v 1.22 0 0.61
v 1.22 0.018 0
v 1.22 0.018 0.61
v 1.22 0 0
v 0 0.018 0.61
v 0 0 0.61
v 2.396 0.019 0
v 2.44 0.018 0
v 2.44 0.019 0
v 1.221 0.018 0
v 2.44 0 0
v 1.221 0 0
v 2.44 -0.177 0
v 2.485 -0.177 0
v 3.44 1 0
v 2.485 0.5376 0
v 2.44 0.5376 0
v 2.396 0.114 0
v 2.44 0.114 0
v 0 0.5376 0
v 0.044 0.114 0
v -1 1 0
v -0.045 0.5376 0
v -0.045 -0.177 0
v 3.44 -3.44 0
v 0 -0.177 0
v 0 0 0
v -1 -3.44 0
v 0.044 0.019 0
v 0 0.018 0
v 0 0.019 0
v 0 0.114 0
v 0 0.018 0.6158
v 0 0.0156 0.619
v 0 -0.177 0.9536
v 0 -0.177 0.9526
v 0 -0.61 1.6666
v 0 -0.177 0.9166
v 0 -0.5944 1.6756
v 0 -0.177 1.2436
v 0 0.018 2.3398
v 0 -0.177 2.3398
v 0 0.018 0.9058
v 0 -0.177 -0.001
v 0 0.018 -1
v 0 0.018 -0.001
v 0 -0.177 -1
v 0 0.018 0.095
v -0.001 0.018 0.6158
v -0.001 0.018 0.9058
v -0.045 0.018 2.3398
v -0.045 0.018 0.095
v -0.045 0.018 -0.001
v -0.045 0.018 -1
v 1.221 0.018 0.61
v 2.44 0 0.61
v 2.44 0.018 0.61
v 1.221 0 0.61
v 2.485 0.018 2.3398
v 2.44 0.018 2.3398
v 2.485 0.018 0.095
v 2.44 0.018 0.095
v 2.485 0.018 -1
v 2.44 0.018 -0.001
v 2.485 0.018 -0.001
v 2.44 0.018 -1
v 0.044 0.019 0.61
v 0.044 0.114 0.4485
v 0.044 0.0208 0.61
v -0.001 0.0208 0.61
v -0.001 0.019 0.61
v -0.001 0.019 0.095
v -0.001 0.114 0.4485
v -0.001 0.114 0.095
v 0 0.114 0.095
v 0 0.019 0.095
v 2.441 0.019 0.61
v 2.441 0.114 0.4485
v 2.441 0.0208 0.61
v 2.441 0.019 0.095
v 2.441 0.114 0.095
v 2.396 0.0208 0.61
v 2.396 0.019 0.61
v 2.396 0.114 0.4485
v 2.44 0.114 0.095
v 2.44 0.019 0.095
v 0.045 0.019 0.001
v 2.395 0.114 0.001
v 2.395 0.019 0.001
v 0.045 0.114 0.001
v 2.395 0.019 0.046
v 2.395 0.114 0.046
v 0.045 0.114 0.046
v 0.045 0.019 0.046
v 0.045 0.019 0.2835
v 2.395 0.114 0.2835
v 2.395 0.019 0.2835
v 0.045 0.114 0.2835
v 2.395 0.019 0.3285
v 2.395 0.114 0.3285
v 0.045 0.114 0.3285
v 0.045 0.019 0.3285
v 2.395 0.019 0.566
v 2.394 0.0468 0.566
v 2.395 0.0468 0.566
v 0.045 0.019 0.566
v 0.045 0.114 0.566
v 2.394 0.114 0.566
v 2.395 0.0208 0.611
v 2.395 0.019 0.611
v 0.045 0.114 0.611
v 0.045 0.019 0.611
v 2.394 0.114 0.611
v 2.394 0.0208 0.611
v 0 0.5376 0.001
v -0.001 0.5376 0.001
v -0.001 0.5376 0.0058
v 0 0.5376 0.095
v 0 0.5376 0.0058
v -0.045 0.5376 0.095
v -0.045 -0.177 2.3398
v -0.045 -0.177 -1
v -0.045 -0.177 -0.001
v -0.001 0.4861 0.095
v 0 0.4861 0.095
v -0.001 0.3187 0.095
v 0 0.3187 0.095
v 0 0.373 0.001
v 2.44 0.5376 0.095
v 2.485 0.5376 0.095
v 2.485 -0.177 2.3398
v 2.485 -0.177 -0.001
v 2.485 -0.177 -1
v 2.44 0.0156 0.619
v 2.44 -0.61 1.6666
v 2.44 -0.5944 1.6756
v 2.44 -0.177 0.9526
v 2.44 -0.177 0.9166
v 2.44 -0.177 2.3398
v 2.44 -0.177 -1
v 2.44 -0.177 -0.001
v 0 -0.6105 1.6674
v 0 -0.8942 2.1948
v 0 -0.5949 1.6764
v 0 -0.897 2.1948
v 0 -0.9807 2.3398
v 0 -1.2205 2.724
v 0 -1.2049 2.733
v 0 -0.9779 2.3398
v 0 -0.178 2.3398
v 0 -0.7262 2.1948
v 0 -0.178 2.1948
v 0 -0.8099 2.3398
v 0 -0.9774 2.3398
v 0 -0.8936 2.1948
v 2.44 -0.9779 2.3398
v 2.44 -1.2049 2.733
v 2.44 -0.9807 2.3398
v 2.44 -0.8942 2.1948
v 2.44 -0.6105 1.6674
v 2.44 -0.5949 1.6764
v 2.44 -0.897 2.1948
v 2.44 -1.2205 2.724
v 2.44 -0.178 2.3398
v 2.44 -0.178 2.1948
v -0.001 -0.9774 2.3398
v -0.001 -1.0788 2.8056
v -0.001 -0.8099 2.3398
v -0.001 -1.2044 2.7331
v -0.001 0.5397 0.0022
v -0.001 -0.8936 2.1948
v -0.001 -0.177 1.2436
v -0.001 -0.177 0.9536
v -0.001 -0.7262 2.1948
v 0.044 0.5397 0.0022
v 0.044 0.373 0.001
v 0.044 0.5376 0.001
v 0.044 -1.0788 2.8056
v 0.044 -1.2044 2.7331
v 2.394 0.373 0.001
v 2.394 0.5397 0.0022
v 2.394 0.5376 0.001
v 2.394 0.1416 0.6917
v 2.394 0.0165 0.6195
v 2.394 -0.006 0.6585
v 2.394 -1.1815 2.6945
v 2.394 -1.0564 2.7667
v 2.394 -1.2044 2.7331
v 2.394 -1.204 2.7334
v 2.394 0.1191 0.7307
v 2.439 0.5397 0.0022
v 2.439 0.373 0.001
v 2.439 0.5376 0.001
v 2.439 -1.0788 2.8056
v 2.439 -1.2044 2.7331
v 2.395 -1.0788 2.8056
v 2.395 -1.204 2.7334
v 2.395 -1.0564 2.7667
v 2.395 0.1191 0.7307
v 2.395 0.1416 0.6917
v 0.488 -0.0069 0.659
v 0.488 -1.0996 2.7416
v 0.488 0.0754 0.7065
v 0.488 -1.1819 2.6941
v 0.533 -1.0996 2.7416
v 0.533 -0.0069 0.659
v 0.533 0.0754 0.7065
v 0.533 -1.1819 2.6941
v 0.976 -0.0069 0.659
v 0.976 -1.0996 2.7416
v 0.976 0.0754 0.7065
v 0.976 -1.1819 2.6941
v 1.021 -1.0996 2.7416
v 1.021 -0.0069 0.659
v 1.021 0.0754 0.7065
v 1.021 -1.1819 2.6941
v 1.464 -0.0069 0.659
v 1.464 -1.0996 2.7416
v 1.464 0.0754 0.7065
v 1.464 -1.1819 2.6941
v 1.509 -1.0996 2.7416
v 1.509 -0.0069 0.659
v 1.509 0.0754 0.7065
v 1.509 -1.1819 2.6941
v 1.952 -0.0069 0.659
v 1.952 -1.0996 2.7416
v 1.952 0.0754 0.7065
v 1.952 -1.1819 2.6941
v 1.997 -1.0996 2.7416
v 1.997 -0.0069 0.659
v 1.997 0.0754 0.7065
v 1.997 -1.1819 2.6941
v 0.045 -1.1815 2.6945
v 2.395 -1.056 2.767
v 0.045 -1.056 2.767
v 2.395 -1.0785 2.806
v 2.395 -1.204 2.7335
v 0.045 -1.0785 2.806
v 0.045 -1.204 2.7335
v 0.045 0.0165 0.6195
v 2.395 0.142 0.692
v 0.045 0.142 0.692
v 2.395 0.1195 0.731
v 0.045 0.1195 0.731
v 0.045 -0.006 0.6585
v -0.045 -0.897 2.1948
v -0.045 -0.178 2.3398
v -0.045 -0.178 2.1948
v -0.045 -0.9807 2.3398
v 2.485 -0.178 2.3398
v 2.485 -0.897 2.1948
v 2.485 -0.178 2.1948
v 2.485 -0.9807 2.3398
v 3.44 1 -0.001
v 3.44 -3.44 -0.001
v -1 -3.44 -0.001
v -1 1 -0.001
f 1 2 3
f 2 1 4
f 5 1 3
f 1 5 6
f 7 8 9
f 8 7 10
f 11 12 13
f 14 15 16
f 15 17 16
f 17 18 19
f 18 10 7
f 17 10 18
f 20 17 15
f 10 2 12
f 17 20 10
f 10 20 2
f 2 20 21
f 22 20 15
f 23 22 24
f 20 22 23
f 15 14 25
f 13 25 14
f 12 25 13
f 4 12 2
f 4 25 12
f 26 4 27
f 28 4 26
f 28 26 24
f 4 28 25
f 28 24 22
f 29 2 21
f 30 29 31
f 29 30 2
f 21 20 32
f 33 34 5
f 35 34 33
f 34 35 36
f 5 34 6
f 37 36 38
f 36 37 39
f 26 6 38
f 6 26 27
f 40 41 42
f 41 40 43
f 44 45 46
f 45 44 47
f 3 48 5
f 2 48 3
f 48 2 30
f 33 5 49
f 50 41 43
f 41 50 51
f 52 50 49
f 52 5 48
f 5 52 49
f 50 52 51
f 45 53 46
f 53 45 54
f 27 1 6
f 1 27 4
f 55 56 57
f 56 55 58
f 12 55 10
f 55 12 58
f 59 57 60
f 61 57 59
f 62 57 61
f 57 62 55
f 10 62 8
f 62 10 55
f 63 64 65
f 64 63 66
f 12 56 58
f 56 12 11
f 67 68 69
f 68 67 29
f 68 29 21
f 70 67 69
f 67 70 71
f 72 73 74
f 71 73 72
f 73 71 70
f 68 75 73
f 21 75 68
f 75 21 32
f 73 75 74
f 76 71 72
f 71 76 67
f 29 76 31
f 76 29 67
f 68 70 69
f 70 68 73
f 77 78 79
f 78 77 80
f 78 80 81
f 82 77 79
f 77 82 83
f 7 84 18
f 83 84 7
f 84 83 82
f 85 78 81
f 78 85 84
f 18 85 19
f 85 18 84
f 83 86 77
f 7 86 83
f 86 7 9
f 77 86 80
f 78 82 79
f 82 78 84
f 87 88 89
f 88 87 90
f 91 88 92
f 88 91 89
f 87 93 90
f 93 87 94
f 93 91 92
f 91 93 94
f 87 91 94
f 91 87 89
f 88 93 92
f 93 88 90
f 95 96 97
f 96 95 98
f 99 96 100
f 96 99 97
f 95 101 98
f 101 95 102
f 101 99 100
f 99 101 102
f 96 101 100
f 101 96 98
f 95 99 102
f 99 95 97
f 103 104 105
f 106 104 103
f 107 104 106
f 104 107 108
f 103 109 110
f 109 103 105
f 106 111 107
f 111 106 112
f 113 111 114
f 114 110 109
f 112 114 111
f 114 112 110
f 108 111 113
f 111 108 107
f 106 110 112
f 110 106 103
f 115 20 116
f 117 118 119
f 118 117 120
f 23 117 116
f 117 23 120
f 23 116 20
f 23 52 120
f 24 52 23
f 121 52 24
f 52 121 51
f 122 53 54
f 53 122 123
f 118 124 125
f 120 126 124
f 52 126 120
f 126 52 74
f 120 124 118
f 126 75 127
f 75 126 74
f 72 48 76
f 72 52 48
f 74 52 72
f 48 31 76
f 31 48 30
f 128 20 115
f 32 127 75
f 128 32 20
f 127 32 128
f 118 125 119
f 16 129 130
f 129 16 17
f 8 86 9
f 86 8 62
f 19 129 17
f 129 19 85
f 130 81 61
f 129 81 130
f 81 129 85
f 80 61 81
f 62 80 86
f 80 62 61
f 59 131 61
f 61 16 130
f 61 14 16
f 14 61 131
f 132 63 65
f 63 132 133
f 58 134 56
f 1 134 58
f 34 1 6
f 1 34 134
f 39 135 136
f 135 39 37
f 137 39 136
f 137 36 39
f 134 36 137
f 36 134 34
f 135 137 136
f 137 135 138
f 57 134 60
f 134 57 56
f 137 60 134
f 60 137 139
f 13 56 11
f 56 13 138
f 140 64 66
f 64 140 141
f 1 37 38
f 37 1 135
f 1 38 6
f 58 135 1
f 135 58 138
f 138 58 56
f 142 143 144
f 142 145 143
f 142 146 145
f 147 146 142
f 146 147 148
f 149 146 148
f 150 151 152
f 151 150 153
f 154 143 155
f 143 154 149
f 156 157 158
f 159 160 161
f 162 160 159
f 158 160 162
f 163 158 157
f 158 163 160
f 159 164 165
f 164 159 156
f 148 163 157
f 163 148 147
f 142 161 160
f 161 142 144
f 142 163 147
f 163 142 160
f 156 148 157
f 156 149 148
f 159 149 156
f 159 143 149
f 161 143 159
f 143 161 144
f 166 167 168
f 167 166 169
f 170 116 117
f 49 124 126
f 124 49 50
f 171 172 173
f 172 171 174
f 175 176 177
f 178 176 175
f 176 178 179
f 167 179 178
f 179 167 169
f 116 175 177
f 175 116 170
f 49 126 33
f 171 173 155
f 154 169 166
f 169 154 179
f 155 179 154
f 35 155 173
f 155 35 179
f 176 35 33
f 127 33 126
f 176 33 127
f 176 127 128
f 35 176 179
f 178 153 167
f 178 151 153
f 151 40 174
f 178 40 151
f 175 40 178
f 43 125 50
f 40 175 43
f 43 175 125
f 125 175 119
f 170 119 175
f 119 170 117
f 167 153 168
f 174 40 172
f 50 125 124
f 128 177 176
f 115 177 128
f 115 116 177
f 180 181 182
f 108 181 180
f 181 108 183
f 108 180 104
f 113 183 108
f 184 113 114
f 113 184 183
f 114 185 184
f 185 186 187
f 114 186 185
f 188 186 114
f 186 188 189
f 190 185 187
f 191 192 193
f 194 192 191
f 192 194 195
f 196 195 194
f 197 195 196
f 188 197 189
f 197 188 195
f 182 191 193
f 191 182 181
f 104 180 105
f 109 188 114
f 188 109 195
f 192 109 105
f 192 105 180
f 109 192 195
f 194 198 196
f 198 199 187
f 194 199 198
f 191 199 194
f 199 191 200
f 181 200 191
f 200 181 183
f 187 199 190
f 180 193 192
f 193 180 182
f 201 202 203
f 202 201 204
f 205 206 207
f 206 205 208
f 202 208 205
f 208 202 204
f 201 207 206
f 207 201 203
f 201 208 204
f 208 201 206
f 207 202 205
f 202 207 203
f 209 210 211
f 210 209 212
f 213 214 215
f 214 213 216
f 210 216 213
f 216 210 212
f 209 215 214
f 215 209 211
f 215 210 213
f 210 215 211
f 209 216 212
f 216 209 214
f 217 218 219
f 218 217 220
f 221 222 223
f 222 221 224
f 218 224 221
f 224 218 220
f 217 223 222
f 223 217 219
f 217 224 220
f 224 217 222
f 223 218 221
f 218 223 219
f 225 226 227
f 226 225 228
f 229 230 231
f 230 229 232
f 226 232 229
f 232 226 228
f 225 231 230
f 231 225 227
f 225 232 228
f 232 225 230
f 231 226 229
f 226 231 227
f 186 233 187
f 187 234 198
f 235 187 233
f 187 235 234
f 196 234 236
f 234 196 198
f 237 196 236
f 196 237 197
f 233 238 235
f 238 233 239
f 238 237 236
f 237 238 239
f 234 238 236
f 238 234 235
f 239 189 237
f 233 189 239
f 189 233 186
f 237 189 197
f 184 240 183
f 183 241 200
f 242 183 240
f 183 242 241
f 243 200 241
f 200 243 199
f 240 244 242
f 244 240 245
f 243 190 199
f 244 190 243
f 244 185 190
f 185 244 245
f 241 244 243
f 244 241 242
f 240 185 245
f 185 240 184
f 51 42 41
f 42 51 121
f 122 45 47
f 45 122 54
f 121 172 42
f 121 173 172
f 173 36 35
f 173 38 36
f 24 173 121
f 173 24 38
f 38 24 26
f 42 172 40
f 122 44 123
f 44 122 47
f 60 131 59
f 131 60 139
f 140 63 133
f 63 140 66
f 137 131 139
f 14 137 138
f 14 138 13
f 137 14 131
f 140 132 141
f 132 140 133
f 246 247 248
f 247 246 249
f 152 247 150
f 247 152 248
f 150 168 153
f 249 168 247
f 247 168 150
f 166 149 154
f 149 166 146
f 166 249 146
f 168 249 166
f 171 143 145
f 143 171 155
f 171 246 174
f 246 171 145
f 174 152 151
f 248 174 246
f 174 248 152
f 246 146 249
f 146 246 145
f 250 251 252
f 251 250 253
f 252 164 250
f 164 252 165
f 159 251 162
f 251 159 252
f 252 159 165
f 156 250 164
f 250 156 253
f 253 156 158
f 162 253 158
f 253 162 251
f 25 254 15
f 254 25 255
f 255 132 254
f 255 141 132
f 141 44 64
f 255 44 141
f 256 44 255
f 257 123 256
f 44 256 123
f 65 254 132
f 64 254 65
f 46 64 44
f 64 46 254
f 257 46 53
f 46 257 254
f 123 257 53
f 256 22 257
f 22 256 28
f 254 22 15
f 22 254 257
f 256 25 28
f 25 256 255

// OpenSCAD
angle = 30;
gap = 0.001;
board_beams = 5;

ply_thickness = 0.018;

ply_8 = 2.44;
ply_4 = 1.22;
ply_2 = 0.61;

beam_2 = 0.045;
beam_4 = 0.095;
beam_6 = 0.145;
beam_8 = 0.195;

ply_color = "#DAB888";
beam_color = "#AE936D";

module ply_2x4() {
    color(ply_color)
    cube([ply_4, ply_thickness, ply_2]);
}

module ply_4x8() {
    color(ply_color)
    cube([ply_8, ply_thickness, ply_4]);
}

module beam_2x4(length) {
    color(beam_color)
        cube([beam_2, beam_4, length]);
}

module beam_2x6(length) {
    color(beam_color)
        cube([beam_2, beam_6, length]);
}

module beam_2x8(length) {
    color(beam_color)
        cube([beam_2, beam_8, length]);
}

module floor(thickness) {
    color("green")
        translate([-1, -1 - 2 * ply_8 * sin(angle), -thickness])
        cube([ply_8 + 2, 2 * ply_8 * sin(angle) + 2, thickness]);
}

module overhang_edge_beam(i) {
    translate([(ply_8 - beam_2) * i, 0, ply_2])
        rotate([angle, 0, 0])
        translate([-gap, ply_thickness, -ply_thickness / 2])
        translate([0, 0, -beam_6 * tan(angle)])
        translate([0, 0, -ply_2 / cos(angle)])
        beam_2x6(ply_8 + (ply_2 / cos(angle)) + (ply_thickness / 2) + (beam_6 * tan(angle)));
}

module kickboard() {
    // ply wood
    for (i = [0 : 1]) {
        translate([(ply_4 + gap) * i, 0, 0])
            ply_2x4();
    }
    
    // vertical beams
    for (i = [0 : 1]) {
        difference() {
            translate([(2 * i * gap) - gap, gap, 0])
                translate([(ply_8 - beam_2) * i, ply_thickness, 0])
                beam_2x4(ply_2);

            translate([(beam_2 * i) - (beam_2 / 2) - (ply_8 * i), 0, 0])
                scale([2, 1, 1])
                overhang_edge_beam(i);
        }
    }
    
    // horizontal beams
    for (i = [0 : 2]) {
        translate([0, 0, (ply_2 - beam_2) * i / 2])
            translate([beam_2, ply_thickness + gap, beam_2 + gap])
            rotate([0, 90, 0])
            beam_2x4(ply_8 - (2 * beam_2));
    }
    
    // connectors to overhang edge beams
    for (i = [0 : 1]) {
        translate([(ply_8 + beam_2) * i, 0, 0])
            translate([-beam_2, ply_thickness, beam_4])
            rotate([-90, 0, 0])
            beam_2x4(ply_2 * tan(angle) + (beam_6 / cos(angle)));
    }
    
}

module overhang() {
    // ply wood
    for (i = [0 : 1]) {
        translate([0, 0, ply_2])
            rotate([angle, 0, 0])
            translate([0, 0, (ply_4 + gap) * i])
            ply_4x8();
    }
    
    // edge beams
    for (i = [0 : 1]) {
        translate([0, 0, gap])
            difference() {
                overhang_edge_beam(i);
                floor(1);
            }
    }
    
    // top beam
    translate([0, 0, ply_2])
        rotate([angle, 0, 0])
        translate([beam_2, ply_thickness + gap, ply_8 + gap])
        rotate([0, 90, 0])
        beam_2x6(ply_8 - (2 * beam_2));
    
    // bottom beam
    translate([0, 0, ply_2])
        rotate([angle, 0, 0])
        translate([beam_2, ply_thickness + gap, beam_2])
        rotate([0, 90, 0])
        beam_2x6(ply_8 - (2 * beam_2));
    
    // middle beams
    for (i = [1 : board_beams - 1]) {
        translate([0, 0, ply_2 + gap])
        rotate([angle, 0, 0])
        translate([ply_8 * i / board_beams, ply_thickness, beam_2])
        beam_2x4(ply_8 - (2 * beam_2));
    }
}

module upright() {
    upright_factor = 1.5;
    
    // vertical beams
    for (i = [0 : 1]) {
        translate([(ply_8 + beam_2) * i, 0, 0])
            translate([-beam_2, ply_thickness - beam_8, -1])
            beam_2x8(ply_2 + (upright_factor * ply_4 * cos(angle)) + beam_6 + 1);
    }
    
    // horizontal beams
    for (i = [0 : 1]) {
        difference() {
            translate([(ply_8 + beam_2) * i, -2 * gap, 0])
                translate([0, 0, ply_2 + (upright_factor * ply_4 * cos(angle))])
                translate([-beam_2, ply_thickness - beam_8 + gap, 0])
                rotate([90, 0, 0])
                beam_2x6(upright_factor * ply_4 * sin(angle) - beam_8 + (beam_6 * tan(angle)));
            
            translate([-0.5, ply_thickness, ply_2])
                rotate([angle, 0, 0])
                mirror([0, 1, 0])
                color(beam_color)
                cube(3);
        }
    }
}

kickboard();
overhang();
upright();
floor(gap);
